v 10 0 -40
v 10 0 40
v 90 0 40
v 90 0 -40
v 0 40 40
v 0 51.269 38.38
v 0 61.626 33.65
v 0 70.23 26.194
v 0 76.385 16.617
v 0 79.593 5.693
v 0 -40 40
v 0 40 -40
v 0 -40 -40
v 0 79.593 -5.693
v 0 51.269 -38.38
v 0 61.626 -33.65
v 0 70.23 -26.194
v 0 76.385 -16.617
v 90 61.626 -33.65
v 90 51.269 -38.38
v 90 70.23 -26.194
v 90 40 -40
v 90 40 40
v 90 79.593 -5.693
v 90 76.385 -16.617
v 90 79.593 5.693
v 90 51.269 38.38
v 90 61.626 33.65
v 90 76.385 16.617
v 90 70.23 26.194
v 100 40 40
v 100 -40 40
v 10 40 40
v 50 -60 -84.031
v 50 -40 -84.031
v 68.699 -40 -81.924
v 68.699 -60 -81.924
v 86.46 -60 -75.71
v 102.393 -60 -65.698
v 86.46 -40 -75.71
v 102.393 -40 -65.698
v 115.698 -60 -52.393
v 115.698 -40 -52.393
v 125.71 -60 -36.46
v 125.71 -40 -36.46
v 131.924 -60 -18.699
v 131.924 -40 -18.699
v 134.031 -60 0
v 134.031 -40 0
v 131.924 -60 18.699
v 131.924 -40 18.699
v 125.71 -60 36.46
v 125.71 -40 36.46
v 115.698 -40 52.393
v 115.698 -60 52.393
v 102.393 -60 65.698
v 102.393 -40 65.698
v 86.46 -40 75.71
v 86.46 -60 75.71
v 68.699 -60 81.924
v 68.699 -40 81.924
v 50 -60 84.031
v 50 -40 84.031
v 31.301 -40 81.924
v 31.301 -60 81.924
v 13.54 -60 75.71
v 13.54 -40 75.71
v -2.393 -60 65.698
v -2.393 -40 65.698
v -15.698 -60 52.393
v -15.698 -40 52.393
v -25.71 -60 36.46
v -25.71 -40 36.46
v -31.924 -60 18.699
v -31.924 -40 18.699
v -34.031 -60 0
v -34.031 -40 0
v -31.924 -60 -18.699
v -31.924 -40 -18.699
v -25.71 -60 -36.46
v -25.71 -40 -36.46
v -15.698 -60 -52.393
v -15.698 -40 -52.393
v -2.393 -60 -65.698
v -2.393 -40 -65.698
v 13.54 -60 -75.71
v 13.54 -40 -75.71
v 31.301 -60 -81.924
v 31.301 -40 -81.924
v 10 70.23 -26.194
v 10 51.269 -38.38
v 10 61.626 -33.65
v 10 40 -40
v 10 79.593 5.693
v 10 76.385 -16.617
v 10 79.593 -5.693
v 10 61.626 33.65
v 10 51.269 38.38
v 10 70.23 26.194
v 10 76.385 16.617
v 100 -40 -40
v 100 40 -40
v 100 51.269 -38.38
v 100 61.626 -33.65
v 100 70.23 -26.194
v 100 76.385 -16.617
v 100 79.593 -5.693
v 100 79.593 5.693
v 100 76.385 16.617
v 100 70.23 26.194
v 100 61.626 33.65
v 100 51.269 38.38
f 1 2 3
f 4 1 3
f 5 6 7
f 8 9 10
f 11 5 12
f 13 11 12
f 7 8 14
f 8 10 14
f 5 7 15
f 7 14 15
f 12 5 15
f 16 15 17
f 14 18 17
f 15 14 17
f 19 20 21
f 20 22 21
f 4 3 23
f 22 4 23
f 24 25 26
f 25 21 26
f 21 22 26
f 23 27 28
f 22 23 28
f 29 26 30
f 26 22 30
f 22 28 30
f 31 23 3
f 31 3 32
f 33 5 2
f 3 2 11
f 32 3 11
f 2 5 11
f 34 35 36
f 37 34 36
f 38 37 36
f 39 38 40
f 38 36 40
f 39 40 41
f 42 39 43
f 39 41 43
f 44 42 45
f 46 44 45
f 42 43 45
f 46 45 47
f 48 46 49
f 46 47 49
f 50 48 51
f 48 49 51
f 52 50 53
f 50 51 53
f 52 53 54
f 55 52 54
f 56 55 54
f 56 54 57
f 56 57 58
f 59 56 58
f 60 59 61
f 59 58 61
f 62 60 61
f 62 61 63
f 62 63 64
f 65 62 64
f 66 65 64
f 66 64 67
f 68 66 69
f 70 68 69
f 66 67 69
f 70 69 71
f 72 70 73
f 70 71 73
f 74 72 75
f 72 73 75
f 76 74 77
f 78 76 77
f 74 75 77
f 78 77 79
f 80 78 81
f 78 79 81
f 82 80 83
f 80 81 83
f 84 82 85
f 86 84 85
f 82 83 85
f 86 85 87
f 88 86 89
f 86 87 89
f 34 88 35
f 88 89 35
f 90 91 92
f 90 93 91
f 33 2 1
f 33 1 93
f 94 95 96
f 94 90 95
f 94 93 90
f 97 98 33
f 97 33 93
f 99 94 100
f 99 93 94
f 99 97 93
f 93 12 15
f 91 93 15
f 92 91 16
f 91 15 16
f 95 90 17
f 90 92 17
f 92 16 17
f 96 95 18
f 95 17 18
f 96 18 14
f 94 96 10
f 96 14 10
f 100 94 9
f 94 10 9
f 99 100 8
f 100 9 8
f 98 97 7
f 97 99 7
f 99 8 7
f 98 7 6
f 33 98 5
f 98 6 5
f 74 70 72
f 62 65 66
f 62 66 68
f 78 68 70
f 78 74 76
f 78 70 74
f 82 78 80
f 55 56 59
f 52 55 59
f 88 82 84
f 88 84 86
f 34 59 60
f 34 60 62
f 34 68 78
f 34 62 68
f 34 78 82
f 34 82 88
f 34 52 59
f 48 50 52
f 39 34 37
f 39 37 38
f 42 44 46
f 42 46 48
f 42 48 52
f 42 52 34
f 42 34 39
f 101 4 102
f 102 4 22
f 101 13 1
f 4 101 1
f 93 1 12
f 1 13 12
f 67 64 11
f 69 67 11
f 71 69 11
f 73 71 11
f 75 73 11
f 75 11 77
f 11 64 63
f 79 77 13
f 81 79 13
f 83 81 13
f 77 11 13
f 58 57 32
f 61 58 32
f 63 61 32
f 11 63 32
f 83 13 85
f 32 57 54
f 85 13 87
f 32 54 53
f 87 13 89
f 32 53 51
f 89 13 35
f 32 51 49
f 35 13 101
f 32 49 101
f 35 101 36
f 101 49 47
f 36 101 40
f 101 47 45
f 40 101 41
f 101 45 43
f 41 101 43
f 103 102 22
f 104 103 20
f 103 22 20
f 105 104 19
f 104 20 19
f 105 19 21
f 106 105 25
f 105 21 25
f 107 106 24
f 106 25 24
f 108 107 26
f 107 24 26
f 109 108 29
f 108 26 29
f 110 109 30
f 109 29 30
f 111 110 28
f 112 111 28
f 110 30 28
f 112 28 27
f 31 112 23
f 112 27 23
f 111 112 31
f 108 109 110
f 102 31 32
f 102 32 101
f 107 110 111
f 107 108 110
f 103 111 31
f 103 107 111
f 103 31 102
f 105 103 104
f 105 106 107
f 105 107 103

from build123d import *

# Parameters (mm, degrees)
BOSS_EXTRUDE1_DEPTH = 100
SKETCH2_R           = 84.031242374
BOSS_EXTRUDE2_DEPTH = 20
SKETCH3_W           = 80
SKETCH3_H           = 80
CUT_EXTRUDE1_DEPTH  = 200.369313128


with BuildPart() as part:
    # Sketch1 → Boss-Extrude1 (new body)
    with BuildSketch(Plane(origin=(0, 0, 0), x_dir=(0, 0, -1), z_dir=(1, 0, 0))):
        with BuildLine():
            Line((-40, 40), (-40, -40))
            Line((-40, -40), (40, -40))
            Line((40, -40), (40, 40))
            ThreePointArc((40, 40), (0, 80), (-40, 40))
        make_face()
    extrude(amount=BOSS_EXTRUDE1_DEPTH)

    # Sketch2 → Boss-Extrude2 (add)
    with BuildSketch(Plane.XZ.offset(40)):
        with Locations(Location((50, 0, 0), (0, 0, 270))):
            Circle(SKETCH2_R)
    extrude(amount=BOSS_EXTRUDE2_DEPTH)

    # Sketch3 → Cut-Extrude1 (cut, through all)
    with BuildSketch(Plane.XY.offset(40)):
        with Locations((50, 40)):
            Rectangle(SKETCH3_W, SKETCH3_H)
    extrude(amount=-CUT_EXTRUDE1_DEPTH, mode=Mode.SUBTRACT)


solid = part.part
